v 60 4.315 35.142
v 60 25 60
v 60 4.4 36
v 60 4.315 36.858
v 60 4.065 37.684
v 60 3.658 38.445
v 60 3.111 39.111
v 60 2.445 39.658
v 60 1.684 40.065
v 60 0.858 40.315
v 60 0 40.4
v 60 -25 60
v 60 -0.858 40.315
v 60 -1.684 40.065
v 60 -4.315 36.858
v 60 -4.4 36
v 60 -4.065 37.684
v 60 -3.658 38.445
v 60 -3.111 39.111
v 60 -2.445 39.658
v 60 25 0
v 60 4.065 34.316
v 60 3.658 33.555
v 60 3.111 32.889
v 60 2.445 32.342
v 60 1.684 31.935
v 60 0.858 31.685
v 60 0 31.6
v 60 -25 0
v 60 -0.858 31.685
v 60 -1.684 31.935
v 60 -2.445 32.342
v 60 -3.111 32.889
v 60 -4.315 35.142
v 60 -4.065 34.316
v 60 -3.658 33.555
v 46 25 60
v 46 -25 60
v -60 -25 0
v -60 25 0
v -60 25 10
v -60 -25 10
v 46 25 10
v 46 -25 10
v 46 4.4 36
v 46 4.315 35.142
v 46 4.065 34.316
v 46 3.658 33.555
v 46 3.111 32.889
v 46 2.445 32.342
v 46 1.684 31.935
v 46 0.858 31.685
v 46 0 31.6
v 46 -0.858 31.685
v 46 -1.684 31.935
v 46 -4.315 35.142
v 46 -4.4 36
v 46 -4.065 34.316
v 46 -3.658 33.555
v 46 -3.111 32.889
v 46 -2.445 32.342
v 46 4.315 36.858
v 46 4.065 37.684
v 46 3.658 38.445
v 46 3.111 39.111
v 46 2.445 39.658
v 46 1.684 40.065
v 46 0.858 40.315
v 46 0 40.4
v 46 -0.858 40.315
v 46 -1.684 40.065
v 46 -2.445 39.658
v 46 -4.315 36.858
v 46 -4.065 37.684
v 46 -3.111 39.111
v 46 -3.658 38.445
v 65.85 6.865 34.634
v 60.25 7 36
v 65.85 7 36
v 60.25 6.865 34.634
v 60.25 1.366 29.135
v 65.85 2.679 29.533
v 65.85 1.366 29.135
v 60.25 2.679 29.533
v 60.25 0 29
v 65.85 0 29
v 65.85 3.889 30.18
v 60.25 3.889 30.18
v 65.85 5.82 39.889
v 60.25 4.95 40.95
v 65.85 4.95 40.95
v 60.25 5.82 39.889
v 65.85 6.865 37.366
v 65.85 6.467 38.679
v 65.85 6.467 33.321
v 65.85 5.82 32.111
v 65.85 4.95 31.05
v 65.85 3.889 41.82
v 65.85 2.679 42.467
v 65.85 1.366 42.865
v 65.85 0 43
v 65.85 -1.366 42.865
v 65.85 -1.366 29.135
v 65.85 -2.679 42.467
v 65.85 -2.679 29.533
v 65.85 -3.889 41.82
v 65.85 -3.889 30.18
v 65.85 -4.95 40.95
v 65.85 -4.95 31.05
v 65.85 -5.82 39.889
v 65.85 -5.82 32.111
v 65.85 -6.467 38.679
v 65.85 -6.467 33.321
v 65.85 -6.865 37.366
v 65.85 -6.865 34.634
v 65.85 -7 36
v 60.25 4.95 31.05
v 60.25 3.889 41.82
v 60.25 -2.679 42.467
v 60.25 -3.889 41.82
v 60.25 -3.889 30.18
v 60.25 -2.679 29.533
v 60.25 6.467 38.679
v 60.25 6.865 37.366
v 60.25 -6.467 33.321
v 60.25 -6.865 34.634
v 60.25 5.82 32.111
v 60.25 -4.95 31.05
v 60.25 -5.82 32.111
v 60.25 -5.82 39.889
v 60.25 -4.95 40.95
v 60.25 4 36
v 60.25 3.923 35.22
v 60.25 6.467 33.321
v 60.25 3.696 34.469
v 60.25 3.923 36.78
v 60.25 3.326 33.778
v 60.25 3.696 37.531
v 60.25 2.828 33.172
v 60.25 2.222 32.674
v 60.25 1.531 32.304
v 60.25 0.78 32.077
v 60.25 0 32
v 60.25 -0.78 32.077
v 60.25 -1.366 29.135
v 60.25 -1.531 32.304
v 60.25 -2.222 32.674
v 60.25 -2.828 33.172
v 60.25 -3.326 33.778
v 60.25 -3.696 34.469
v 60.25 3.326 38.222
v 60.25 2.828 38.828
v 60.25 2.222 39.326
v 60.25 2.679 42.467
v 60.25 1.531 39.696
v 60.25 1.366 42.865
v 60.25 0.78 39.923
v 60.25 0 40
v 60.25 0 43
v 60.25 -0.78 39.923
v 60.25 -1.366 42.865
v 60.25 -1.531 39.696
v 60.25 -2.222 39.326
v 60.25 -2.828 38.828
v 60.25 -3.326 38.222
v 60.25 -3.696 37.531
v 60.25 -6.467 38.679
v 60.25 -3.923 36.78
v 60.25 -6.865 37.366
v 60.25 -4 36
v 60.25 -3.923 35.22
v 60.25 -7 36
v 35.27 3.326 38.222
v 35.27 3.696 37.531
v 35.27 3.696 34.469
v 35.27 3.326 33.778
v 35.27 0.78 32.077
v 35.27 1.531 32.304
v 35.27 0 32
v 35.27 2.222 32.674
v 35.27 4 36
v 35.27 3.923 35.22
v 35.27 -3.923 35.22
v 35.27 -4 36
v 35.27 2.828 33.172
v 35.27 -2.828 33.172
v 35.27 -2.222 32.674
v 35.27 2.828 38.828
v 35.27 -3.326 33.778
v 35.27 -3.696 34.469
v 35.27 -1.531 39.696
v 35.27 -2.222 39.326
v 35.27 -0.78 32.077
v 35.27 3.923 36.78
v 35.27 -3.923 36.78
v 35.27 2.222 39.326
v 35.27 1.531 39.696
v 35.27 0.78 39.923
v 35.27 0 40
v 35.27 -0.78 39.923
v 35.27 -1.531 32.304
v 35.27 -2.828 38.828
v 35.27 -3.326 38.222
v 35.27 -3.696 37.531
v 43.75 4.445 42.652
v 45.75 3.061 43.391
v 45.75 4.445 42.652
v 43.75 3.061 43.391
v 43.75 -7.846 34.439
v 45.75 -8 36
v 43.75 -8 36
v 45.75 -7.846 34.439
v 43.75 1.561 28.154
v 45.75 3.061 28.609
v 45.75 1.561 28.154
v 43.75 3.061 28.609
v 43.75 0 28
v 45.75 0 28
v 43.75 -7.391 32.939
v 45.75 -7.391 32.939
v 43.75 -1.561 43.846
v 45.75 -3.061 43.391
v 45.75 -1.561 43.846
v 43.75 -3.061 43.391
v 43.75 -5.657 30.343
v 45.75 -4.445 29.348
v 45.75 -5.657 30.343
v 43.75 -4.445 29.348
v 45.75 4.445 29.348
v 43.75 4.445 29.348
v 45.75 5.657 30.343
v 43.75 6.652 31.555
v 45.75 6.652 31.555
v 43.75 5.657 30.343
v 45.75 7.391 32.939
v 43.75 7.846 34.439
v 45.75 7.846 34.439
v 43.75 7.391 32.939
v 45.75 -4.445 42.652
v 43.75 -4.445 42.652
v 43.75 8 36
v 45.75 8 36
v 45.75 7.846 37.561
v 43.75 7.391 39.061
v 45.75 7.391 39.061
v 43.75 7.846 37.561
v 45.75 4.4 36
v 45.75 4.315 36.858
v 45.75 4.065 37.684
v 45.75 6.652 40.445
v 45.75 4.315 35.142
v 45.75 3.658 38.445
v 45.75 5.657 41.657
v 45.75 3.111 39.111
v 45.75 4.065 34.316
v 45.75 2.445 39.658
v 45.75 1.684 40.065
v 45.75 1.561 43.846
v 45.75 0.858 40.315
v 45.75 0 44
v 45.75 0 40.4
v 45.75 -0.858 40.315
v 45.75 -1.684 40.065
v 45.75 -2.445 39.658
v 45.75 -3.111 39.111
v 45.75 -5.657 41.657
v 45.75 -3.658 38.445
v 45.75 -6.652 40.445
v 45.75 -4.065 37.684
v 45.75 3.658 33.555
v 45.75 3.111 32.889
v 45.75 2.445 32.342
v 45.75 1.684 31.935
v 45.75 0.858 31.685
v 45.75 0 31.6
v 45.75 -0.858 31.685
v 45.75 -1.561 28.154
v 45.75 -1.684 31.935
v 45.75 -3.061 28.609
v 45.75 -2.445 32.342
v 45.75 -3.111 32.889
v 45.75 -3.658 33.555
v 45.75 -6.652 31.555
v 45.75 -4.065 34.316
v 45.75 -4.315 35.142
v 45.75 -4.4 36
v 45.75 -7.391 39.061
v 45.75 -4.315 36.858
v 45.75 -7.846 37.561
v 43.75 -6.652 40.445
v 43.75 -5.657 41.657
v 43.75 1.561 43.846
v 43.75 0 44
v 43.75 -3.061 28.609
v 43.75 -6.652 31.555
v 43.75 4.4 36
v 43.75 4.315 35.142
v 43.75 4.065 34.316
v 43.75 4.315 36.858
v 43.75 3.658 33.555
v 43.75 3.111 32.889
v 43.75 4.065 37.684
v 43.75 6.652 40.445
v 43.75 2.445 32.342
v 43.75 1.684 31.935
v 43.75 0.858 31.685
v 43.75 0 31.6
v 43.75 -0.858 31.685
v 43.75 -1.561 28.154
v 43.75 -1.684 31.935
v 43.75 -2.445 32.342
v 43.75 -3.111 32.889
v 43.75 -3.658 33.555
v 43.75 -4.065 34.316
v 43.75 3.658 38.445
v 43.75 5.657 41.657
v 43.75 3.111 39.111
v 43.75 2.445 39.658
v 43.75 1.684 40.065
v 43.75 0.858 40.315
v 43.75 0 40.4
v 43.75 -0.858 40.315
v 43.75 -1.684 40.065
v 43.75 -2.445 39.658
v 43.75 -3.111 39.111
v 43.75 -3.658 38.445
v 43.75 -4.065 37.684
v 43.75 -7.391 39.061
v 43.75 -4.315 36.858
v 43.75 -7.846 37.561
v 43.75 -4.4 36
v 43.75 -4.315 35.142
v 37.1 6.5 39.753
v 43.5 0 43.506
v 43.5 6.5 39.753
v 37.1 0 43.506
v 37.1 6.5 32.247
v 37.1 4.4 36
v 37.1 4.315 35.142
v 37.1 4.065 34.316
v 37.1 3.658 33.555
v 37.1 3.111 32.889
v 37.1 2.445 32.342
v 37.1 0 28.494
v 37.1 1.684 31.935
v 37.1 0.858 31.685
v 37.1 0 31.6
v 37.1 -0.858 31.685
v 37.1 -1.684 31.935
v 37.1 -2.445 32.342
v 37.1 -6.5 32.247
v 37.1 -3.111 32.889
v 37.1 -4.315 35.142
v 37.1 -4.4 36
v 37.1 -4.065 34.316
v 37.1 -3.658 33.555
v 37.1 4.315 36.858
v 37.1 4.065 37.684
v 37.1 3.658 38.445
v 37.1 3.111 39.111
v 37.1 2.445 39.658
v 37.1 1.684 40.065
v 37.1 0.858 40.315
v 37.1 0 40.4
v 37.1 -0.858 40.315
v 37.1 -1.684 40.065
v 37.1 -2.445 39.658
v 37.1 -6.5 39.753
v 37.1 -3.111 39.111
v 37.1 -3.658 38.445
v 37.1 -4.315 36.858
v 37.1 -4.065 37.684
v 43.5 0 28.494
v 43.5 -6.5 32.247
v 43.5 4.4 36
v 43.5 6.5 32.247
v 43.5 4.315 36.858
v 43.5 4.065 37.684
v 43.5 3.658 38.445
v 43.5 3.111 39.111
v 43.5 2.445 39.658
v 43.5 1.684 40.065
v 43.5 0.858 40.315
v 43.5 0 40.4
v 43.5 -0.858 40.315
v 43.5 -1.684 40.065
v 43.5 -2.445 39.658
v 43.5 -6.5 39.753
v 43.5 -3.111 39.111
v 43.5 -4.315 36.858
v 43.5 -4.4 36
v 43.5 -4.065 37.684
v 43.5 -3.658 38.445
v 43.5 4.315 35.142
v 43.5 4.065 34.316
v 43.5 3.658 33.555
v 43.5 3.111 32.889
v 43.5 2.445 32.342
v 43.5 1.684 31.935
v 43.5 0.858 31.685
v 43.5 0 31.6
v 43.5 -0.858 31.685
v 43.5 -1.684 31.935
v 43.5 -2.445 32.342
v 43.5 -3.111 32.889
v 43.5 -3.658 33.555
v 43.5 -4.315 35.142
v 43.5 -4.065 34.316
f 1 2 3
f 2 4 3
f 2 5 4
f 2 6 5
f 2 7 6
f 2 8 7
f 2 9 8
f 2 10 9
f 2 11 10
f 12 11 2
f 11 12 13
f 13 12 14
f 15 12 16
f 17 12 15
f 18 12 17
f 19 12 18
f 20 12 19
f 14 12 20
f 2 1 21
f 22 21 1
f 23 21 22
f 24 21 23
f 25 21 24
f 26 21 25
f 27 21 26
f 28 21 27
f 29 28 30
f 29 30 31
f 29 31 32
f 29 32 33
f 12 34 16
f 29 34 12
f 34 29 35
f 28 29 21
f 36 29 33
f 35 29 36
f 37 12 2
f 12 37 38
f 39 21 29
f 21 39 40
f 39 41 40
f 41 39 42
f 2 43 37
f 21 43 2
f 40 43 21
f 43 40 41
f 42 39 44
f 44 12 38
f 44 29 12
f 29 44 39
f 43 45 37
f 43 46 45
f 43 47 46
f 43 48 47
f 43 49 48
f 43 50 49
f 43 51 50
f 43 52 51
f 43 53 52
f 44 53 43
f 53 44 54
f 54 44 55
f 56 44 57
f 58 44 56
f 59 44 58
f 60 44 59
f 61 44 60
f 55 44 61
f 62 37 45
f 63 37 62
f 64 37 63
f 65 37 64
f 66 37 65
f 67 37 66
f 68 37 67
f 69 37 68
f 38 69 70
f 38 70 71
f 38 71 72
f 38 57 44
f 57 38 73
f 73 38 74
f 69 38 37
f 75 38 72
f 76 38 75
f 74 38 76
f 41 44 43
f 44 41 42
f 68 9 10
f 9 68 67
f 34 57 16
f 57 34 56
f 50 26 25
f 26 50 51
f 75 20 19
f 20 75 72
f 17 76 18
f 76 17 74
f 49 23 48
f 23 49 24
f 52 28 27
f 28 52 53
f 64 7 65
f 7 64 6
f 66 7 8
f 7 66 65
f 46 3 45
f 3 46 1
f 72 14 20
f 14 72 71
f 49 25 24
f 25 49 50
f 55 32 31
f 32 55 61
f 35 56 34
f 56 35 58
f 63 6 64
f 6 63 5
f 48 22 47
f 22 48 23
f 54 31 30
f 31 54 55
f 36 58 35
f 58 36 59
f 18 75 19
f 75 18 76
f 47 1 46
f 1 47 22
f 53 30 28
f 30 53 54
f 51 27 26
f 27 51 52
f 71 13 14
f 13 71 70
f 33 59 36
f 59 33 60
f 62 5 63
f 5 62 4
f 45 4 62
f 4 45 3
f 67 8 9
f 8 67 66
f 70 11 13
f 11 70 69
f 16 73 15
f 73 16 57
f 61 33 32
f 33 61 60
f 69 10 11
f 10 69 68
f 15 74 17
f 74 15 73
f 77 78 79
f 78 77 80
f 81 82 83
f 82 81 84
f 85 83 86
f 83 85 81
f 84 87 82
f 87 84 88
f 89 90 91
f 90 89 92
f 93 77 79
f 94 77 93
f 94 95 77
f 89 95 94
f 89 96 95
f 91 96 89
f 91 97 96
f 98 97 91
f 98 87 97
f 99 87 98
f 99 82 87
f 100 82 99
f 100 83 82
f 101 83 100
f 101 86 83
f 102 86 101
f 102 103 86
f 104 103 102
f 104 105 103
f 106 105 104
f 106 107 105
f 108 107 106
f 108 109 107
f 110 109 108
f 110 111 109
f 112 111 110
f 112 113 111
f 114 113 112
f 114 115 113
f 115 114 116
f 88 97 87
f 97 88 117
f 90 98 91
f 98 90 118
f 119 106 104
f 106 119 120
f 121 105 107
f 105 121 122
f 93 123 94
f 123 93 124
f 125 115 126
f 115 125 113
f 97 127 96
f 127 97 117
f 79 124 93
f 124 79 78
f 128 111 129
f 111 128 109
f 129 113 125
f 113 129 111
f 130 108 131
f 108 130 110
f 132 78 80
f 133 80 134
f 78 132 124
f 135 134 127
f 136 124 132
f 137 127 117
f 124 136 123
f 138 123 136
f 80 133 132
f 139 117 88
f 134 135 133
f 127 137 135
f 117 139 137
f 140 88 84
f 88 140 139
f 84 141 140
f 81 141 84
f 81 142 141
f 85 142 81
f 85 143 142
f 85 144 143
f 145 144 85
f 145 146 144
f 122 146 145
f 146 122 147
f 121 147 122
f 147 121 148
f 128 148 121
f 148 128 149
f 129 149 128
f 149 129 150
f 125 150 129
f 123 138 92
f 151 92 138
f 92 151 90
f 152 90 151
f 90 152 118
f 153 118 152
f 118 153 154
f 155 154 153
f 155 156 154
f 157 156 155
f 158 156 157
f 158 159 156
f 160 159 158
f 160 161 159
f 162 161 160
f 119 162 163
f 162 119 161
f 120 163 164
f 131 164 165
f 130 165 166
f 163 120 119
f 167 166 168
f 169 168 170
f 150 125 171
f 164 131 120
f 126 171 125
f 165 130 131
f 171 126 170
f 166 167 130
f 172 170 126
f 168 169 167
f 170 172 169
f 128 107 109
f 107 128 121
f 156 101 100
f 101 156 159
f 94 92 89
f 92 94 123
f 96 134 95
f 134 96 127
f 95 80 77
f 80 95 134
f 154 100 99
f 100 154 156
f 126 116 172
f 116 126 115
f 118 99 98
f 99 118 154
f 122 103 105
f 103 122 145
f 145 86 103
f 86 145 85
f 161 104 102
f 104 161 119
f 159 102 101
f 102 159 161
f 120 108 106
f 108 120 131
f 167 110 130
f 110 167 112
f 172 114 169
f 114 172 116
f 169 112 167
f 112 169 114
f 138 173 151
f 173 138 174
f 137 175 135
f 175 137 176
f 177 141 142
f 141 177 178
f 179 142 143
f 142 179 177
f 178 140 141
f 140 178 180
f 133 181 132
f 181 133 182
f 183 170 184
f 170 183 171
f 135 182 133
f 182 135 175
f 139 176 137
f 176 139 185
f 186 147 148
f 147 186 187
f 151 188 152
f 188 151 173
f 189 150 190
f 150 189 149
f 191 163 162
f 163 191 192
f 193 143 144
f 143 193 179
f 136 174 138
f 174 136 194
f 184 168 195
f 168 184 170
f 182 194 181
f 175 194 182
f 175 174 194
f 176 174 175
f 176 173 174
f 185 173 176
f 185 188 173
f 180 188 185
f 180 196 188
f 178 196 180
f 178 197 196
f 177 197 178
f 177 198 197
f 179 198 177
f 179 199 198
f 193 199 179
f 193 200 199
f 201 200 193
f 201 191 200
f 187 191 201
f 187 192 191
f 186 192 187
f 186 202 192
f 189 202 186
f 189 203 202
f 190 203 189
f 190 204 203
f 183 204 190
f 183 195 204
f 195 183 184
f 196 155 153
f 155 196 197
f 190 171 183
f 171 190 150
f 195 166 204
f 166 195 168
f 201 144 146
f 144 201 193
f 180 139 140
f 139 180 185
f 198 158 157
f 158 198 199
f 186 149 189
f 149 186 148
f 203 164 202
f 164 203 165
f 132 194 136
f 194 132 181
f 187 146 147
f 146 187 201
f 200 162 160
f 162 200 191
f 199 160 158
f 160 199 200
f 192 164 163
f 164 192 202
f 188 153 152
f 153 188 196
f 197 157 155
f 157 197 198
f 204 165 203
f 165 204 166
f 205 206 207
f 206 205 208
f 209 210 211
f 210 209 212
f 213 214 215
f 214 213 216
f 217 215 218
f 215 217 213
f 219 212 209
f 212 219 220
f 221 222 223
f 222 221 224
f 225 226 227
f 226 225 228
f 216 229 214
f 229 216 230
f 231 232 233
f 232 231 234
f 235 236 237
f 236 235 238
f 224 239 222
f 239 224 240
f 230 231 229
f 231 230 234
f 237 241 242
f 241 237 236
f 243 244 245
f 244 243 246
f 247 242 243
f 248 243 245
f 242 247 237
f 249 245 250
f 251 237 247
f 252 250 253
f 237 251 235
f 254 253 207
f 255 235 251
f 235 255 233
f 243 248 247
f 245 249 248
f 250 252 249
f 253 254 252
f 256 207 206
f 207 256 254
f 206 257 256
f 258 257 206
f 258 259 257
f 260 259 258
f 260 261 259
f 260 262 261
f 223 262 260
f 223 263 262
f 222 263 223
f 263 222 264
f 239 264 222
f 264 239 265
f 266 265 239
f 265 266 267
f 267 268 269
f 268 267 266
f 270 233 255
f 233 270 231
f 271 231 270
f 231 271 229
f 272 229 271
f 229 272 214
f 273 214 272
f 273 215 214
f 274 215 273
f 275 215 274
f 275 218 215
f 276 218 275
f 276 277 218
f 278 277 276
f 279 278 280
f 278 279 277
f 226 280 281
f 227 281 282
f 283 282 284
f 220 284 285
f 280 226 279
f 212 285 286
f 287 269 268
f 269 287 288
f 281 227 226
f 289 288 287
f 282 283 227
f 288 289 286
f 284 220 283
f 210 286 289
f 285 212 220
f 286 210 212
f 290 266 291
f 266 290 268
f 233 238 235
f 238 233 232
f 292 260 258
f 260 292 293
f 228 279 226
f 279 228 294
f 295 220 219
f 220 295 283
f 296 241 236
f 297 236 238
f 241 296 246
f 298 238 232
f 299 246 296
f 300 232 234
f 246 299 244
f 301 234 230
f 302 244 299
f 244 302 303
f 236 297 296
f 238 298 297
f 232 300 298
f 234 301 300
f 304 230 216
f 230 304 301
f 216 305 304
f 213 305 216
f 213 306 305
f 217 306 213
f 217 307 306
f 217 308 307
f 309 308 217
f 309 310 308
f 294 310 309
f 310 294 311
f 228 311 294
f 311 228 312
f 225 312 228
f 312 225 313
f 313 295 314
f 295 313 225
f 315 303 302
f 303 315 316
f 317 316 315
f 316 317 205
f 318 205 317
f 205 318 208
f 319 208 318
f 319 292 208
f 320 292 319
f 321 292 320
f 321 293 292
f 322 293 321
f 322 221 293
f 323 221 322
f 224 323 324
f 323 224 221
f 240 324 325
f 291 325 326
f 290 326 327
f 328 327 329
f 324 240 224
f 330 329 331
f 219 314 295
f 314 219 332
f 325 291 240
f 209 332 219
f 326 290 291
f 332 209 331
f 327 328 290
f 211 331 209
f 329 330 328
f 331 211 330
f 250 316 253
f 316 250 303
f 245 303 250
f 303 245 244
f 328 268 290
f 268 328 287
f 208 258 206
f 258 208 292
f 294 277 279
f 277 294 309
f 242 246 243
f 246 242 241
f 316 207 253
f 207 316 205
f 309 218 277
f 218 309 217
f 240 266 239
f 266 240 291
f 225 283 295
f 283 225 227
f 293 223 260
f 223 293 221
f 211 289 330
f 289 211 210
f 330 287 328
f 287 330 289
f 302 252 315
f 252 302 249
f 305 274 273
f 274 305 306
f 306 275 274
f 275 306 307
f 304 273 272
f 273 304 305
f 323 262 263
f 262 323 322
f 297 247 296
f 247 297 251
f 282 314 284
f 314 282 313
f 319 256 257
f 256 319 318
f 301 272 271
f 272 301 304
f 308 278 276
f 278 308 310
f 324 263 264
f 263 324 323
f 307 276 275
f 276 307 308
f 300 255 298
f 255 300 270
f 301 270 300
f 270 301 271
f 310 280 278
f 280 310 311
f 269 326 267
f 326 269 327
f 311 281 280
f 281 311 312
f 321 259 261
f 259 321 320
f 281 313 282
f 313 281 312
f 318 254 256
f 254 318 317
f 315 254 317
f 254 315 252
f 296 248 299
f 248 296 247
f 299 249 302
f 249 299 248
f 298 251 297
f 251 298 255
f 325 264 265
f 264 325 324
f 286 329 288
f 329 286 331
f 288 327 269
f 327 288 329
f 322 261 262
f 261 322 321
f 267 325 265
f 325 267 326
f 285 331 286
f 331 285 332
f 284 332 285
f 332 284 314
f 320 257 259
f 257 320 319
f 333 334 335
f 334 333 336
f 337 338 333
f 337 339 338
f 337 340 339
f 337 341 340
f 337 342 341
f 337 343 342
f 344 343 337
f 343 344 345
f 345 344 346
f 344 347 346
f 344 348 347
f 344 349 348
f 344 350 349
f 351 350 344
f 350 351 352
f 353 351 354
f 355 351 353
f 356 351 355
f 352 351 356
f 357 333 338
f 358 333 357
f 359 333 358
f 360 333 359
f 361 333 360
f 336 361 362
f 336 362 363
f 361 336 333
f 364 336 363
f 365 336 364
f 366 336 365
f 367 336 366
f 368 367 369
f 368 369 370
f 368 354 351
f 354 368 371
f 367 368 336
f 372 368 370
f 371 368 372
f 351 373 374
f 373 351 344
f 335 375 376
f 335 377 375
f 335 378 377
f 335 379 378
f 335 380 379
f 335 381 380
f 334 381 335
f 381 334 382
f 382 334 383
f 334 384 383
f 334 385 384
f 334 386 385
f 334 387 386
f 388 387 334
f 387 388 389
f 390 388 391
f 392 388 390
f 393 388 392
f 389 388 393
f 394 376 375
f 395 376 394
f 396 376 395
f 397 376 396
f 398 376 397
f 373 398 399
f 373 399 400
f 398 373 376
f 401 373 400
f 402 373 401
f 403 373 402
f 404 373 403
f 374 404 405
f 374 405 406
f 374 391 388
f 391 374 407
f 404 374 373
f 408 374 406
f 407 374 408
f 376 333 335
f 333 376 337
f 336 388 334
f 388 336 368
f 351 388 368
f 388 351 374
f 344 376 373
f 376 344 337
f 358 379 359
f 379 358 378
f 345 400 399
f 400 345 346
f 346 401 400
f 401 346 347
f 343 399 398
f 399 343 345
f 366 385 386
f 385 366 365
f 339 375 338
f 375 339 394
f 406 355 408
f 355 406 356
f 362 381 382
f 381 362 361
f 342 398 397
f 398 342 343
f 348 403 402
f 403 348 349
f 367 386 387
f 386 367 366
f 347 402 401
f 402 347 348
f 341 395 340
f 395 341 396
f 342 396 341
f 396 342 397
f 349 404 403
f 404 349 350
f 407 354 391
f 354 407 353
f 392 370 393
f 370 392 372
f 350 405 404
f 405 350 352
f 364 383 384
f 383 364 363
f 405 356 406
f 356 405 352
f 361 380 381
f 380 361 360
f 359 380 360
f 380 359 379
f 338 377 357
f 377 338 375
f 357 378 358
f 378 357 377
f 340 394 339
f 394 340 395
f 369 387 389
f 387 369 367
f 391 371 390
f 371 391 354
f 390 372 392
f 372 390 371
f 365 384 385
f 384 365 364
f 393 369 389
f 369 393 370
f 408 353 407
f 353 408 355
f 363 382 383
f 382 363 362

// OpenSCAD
$fn = 32;

// ------------------------------------------------------------------------
// Bolted bracket: 120 x 50 mm bracket with 1 bolt joints
// Every part is its own module, assembly() places them once.
// ------------------------------------------------------------------------

// --- part 1 ---
module bracket() {
  difference() {
    translate([-60, -25, 0]) cube([120, 50, 60]);
    translate([-61, -26, 10]) cube([107, 52, 51]);
    translate([53, 0, 36]) rotate([0, 90, 0]) cylinder(h = 16, d = 8.8, center = true);
  }
}

// --- part 2 ---
module bolt() {
  cylinder(h = 5.6, d = 14);
  translate([0, 0, -24.98]) cylinder(h = 24.98, d = 8);
}

// --- part 3 ---
module washer() {
  difference() {
      translate([0, 0, 0]) cylinder(h = 2, d = 16);
      translate([0, 0, -1]) cylinder(h = 4, d = 8.8);
    }
}

// --- part 4 ---
module nut() {
  difference() {
    linear_extrude(height = 6.4) polygon(points = [[7.506, 0], [3.753, 6.5], [-3.753, 6.5], [-7.506, 0], [-3.753, -6.5], [3.753, -6.5]]);
    translate([0, 0, -1]) cylinder(h = 8.4, d = 8.8);
  }
}

// --- assembly ---
module assembly() {
  translate([0, 0, 0]) rotate([0, 0, 0]) bracket();
  translate([60.25, 0, 36]) rotate([0, 90, 0]) bolt();
  translate([43.75, 0, 36]) rotate([0, 90, 0]) washer();
  translate([37.1, 0, 36]) rotate([0, 90, 0]) nut();
}

assembly();
